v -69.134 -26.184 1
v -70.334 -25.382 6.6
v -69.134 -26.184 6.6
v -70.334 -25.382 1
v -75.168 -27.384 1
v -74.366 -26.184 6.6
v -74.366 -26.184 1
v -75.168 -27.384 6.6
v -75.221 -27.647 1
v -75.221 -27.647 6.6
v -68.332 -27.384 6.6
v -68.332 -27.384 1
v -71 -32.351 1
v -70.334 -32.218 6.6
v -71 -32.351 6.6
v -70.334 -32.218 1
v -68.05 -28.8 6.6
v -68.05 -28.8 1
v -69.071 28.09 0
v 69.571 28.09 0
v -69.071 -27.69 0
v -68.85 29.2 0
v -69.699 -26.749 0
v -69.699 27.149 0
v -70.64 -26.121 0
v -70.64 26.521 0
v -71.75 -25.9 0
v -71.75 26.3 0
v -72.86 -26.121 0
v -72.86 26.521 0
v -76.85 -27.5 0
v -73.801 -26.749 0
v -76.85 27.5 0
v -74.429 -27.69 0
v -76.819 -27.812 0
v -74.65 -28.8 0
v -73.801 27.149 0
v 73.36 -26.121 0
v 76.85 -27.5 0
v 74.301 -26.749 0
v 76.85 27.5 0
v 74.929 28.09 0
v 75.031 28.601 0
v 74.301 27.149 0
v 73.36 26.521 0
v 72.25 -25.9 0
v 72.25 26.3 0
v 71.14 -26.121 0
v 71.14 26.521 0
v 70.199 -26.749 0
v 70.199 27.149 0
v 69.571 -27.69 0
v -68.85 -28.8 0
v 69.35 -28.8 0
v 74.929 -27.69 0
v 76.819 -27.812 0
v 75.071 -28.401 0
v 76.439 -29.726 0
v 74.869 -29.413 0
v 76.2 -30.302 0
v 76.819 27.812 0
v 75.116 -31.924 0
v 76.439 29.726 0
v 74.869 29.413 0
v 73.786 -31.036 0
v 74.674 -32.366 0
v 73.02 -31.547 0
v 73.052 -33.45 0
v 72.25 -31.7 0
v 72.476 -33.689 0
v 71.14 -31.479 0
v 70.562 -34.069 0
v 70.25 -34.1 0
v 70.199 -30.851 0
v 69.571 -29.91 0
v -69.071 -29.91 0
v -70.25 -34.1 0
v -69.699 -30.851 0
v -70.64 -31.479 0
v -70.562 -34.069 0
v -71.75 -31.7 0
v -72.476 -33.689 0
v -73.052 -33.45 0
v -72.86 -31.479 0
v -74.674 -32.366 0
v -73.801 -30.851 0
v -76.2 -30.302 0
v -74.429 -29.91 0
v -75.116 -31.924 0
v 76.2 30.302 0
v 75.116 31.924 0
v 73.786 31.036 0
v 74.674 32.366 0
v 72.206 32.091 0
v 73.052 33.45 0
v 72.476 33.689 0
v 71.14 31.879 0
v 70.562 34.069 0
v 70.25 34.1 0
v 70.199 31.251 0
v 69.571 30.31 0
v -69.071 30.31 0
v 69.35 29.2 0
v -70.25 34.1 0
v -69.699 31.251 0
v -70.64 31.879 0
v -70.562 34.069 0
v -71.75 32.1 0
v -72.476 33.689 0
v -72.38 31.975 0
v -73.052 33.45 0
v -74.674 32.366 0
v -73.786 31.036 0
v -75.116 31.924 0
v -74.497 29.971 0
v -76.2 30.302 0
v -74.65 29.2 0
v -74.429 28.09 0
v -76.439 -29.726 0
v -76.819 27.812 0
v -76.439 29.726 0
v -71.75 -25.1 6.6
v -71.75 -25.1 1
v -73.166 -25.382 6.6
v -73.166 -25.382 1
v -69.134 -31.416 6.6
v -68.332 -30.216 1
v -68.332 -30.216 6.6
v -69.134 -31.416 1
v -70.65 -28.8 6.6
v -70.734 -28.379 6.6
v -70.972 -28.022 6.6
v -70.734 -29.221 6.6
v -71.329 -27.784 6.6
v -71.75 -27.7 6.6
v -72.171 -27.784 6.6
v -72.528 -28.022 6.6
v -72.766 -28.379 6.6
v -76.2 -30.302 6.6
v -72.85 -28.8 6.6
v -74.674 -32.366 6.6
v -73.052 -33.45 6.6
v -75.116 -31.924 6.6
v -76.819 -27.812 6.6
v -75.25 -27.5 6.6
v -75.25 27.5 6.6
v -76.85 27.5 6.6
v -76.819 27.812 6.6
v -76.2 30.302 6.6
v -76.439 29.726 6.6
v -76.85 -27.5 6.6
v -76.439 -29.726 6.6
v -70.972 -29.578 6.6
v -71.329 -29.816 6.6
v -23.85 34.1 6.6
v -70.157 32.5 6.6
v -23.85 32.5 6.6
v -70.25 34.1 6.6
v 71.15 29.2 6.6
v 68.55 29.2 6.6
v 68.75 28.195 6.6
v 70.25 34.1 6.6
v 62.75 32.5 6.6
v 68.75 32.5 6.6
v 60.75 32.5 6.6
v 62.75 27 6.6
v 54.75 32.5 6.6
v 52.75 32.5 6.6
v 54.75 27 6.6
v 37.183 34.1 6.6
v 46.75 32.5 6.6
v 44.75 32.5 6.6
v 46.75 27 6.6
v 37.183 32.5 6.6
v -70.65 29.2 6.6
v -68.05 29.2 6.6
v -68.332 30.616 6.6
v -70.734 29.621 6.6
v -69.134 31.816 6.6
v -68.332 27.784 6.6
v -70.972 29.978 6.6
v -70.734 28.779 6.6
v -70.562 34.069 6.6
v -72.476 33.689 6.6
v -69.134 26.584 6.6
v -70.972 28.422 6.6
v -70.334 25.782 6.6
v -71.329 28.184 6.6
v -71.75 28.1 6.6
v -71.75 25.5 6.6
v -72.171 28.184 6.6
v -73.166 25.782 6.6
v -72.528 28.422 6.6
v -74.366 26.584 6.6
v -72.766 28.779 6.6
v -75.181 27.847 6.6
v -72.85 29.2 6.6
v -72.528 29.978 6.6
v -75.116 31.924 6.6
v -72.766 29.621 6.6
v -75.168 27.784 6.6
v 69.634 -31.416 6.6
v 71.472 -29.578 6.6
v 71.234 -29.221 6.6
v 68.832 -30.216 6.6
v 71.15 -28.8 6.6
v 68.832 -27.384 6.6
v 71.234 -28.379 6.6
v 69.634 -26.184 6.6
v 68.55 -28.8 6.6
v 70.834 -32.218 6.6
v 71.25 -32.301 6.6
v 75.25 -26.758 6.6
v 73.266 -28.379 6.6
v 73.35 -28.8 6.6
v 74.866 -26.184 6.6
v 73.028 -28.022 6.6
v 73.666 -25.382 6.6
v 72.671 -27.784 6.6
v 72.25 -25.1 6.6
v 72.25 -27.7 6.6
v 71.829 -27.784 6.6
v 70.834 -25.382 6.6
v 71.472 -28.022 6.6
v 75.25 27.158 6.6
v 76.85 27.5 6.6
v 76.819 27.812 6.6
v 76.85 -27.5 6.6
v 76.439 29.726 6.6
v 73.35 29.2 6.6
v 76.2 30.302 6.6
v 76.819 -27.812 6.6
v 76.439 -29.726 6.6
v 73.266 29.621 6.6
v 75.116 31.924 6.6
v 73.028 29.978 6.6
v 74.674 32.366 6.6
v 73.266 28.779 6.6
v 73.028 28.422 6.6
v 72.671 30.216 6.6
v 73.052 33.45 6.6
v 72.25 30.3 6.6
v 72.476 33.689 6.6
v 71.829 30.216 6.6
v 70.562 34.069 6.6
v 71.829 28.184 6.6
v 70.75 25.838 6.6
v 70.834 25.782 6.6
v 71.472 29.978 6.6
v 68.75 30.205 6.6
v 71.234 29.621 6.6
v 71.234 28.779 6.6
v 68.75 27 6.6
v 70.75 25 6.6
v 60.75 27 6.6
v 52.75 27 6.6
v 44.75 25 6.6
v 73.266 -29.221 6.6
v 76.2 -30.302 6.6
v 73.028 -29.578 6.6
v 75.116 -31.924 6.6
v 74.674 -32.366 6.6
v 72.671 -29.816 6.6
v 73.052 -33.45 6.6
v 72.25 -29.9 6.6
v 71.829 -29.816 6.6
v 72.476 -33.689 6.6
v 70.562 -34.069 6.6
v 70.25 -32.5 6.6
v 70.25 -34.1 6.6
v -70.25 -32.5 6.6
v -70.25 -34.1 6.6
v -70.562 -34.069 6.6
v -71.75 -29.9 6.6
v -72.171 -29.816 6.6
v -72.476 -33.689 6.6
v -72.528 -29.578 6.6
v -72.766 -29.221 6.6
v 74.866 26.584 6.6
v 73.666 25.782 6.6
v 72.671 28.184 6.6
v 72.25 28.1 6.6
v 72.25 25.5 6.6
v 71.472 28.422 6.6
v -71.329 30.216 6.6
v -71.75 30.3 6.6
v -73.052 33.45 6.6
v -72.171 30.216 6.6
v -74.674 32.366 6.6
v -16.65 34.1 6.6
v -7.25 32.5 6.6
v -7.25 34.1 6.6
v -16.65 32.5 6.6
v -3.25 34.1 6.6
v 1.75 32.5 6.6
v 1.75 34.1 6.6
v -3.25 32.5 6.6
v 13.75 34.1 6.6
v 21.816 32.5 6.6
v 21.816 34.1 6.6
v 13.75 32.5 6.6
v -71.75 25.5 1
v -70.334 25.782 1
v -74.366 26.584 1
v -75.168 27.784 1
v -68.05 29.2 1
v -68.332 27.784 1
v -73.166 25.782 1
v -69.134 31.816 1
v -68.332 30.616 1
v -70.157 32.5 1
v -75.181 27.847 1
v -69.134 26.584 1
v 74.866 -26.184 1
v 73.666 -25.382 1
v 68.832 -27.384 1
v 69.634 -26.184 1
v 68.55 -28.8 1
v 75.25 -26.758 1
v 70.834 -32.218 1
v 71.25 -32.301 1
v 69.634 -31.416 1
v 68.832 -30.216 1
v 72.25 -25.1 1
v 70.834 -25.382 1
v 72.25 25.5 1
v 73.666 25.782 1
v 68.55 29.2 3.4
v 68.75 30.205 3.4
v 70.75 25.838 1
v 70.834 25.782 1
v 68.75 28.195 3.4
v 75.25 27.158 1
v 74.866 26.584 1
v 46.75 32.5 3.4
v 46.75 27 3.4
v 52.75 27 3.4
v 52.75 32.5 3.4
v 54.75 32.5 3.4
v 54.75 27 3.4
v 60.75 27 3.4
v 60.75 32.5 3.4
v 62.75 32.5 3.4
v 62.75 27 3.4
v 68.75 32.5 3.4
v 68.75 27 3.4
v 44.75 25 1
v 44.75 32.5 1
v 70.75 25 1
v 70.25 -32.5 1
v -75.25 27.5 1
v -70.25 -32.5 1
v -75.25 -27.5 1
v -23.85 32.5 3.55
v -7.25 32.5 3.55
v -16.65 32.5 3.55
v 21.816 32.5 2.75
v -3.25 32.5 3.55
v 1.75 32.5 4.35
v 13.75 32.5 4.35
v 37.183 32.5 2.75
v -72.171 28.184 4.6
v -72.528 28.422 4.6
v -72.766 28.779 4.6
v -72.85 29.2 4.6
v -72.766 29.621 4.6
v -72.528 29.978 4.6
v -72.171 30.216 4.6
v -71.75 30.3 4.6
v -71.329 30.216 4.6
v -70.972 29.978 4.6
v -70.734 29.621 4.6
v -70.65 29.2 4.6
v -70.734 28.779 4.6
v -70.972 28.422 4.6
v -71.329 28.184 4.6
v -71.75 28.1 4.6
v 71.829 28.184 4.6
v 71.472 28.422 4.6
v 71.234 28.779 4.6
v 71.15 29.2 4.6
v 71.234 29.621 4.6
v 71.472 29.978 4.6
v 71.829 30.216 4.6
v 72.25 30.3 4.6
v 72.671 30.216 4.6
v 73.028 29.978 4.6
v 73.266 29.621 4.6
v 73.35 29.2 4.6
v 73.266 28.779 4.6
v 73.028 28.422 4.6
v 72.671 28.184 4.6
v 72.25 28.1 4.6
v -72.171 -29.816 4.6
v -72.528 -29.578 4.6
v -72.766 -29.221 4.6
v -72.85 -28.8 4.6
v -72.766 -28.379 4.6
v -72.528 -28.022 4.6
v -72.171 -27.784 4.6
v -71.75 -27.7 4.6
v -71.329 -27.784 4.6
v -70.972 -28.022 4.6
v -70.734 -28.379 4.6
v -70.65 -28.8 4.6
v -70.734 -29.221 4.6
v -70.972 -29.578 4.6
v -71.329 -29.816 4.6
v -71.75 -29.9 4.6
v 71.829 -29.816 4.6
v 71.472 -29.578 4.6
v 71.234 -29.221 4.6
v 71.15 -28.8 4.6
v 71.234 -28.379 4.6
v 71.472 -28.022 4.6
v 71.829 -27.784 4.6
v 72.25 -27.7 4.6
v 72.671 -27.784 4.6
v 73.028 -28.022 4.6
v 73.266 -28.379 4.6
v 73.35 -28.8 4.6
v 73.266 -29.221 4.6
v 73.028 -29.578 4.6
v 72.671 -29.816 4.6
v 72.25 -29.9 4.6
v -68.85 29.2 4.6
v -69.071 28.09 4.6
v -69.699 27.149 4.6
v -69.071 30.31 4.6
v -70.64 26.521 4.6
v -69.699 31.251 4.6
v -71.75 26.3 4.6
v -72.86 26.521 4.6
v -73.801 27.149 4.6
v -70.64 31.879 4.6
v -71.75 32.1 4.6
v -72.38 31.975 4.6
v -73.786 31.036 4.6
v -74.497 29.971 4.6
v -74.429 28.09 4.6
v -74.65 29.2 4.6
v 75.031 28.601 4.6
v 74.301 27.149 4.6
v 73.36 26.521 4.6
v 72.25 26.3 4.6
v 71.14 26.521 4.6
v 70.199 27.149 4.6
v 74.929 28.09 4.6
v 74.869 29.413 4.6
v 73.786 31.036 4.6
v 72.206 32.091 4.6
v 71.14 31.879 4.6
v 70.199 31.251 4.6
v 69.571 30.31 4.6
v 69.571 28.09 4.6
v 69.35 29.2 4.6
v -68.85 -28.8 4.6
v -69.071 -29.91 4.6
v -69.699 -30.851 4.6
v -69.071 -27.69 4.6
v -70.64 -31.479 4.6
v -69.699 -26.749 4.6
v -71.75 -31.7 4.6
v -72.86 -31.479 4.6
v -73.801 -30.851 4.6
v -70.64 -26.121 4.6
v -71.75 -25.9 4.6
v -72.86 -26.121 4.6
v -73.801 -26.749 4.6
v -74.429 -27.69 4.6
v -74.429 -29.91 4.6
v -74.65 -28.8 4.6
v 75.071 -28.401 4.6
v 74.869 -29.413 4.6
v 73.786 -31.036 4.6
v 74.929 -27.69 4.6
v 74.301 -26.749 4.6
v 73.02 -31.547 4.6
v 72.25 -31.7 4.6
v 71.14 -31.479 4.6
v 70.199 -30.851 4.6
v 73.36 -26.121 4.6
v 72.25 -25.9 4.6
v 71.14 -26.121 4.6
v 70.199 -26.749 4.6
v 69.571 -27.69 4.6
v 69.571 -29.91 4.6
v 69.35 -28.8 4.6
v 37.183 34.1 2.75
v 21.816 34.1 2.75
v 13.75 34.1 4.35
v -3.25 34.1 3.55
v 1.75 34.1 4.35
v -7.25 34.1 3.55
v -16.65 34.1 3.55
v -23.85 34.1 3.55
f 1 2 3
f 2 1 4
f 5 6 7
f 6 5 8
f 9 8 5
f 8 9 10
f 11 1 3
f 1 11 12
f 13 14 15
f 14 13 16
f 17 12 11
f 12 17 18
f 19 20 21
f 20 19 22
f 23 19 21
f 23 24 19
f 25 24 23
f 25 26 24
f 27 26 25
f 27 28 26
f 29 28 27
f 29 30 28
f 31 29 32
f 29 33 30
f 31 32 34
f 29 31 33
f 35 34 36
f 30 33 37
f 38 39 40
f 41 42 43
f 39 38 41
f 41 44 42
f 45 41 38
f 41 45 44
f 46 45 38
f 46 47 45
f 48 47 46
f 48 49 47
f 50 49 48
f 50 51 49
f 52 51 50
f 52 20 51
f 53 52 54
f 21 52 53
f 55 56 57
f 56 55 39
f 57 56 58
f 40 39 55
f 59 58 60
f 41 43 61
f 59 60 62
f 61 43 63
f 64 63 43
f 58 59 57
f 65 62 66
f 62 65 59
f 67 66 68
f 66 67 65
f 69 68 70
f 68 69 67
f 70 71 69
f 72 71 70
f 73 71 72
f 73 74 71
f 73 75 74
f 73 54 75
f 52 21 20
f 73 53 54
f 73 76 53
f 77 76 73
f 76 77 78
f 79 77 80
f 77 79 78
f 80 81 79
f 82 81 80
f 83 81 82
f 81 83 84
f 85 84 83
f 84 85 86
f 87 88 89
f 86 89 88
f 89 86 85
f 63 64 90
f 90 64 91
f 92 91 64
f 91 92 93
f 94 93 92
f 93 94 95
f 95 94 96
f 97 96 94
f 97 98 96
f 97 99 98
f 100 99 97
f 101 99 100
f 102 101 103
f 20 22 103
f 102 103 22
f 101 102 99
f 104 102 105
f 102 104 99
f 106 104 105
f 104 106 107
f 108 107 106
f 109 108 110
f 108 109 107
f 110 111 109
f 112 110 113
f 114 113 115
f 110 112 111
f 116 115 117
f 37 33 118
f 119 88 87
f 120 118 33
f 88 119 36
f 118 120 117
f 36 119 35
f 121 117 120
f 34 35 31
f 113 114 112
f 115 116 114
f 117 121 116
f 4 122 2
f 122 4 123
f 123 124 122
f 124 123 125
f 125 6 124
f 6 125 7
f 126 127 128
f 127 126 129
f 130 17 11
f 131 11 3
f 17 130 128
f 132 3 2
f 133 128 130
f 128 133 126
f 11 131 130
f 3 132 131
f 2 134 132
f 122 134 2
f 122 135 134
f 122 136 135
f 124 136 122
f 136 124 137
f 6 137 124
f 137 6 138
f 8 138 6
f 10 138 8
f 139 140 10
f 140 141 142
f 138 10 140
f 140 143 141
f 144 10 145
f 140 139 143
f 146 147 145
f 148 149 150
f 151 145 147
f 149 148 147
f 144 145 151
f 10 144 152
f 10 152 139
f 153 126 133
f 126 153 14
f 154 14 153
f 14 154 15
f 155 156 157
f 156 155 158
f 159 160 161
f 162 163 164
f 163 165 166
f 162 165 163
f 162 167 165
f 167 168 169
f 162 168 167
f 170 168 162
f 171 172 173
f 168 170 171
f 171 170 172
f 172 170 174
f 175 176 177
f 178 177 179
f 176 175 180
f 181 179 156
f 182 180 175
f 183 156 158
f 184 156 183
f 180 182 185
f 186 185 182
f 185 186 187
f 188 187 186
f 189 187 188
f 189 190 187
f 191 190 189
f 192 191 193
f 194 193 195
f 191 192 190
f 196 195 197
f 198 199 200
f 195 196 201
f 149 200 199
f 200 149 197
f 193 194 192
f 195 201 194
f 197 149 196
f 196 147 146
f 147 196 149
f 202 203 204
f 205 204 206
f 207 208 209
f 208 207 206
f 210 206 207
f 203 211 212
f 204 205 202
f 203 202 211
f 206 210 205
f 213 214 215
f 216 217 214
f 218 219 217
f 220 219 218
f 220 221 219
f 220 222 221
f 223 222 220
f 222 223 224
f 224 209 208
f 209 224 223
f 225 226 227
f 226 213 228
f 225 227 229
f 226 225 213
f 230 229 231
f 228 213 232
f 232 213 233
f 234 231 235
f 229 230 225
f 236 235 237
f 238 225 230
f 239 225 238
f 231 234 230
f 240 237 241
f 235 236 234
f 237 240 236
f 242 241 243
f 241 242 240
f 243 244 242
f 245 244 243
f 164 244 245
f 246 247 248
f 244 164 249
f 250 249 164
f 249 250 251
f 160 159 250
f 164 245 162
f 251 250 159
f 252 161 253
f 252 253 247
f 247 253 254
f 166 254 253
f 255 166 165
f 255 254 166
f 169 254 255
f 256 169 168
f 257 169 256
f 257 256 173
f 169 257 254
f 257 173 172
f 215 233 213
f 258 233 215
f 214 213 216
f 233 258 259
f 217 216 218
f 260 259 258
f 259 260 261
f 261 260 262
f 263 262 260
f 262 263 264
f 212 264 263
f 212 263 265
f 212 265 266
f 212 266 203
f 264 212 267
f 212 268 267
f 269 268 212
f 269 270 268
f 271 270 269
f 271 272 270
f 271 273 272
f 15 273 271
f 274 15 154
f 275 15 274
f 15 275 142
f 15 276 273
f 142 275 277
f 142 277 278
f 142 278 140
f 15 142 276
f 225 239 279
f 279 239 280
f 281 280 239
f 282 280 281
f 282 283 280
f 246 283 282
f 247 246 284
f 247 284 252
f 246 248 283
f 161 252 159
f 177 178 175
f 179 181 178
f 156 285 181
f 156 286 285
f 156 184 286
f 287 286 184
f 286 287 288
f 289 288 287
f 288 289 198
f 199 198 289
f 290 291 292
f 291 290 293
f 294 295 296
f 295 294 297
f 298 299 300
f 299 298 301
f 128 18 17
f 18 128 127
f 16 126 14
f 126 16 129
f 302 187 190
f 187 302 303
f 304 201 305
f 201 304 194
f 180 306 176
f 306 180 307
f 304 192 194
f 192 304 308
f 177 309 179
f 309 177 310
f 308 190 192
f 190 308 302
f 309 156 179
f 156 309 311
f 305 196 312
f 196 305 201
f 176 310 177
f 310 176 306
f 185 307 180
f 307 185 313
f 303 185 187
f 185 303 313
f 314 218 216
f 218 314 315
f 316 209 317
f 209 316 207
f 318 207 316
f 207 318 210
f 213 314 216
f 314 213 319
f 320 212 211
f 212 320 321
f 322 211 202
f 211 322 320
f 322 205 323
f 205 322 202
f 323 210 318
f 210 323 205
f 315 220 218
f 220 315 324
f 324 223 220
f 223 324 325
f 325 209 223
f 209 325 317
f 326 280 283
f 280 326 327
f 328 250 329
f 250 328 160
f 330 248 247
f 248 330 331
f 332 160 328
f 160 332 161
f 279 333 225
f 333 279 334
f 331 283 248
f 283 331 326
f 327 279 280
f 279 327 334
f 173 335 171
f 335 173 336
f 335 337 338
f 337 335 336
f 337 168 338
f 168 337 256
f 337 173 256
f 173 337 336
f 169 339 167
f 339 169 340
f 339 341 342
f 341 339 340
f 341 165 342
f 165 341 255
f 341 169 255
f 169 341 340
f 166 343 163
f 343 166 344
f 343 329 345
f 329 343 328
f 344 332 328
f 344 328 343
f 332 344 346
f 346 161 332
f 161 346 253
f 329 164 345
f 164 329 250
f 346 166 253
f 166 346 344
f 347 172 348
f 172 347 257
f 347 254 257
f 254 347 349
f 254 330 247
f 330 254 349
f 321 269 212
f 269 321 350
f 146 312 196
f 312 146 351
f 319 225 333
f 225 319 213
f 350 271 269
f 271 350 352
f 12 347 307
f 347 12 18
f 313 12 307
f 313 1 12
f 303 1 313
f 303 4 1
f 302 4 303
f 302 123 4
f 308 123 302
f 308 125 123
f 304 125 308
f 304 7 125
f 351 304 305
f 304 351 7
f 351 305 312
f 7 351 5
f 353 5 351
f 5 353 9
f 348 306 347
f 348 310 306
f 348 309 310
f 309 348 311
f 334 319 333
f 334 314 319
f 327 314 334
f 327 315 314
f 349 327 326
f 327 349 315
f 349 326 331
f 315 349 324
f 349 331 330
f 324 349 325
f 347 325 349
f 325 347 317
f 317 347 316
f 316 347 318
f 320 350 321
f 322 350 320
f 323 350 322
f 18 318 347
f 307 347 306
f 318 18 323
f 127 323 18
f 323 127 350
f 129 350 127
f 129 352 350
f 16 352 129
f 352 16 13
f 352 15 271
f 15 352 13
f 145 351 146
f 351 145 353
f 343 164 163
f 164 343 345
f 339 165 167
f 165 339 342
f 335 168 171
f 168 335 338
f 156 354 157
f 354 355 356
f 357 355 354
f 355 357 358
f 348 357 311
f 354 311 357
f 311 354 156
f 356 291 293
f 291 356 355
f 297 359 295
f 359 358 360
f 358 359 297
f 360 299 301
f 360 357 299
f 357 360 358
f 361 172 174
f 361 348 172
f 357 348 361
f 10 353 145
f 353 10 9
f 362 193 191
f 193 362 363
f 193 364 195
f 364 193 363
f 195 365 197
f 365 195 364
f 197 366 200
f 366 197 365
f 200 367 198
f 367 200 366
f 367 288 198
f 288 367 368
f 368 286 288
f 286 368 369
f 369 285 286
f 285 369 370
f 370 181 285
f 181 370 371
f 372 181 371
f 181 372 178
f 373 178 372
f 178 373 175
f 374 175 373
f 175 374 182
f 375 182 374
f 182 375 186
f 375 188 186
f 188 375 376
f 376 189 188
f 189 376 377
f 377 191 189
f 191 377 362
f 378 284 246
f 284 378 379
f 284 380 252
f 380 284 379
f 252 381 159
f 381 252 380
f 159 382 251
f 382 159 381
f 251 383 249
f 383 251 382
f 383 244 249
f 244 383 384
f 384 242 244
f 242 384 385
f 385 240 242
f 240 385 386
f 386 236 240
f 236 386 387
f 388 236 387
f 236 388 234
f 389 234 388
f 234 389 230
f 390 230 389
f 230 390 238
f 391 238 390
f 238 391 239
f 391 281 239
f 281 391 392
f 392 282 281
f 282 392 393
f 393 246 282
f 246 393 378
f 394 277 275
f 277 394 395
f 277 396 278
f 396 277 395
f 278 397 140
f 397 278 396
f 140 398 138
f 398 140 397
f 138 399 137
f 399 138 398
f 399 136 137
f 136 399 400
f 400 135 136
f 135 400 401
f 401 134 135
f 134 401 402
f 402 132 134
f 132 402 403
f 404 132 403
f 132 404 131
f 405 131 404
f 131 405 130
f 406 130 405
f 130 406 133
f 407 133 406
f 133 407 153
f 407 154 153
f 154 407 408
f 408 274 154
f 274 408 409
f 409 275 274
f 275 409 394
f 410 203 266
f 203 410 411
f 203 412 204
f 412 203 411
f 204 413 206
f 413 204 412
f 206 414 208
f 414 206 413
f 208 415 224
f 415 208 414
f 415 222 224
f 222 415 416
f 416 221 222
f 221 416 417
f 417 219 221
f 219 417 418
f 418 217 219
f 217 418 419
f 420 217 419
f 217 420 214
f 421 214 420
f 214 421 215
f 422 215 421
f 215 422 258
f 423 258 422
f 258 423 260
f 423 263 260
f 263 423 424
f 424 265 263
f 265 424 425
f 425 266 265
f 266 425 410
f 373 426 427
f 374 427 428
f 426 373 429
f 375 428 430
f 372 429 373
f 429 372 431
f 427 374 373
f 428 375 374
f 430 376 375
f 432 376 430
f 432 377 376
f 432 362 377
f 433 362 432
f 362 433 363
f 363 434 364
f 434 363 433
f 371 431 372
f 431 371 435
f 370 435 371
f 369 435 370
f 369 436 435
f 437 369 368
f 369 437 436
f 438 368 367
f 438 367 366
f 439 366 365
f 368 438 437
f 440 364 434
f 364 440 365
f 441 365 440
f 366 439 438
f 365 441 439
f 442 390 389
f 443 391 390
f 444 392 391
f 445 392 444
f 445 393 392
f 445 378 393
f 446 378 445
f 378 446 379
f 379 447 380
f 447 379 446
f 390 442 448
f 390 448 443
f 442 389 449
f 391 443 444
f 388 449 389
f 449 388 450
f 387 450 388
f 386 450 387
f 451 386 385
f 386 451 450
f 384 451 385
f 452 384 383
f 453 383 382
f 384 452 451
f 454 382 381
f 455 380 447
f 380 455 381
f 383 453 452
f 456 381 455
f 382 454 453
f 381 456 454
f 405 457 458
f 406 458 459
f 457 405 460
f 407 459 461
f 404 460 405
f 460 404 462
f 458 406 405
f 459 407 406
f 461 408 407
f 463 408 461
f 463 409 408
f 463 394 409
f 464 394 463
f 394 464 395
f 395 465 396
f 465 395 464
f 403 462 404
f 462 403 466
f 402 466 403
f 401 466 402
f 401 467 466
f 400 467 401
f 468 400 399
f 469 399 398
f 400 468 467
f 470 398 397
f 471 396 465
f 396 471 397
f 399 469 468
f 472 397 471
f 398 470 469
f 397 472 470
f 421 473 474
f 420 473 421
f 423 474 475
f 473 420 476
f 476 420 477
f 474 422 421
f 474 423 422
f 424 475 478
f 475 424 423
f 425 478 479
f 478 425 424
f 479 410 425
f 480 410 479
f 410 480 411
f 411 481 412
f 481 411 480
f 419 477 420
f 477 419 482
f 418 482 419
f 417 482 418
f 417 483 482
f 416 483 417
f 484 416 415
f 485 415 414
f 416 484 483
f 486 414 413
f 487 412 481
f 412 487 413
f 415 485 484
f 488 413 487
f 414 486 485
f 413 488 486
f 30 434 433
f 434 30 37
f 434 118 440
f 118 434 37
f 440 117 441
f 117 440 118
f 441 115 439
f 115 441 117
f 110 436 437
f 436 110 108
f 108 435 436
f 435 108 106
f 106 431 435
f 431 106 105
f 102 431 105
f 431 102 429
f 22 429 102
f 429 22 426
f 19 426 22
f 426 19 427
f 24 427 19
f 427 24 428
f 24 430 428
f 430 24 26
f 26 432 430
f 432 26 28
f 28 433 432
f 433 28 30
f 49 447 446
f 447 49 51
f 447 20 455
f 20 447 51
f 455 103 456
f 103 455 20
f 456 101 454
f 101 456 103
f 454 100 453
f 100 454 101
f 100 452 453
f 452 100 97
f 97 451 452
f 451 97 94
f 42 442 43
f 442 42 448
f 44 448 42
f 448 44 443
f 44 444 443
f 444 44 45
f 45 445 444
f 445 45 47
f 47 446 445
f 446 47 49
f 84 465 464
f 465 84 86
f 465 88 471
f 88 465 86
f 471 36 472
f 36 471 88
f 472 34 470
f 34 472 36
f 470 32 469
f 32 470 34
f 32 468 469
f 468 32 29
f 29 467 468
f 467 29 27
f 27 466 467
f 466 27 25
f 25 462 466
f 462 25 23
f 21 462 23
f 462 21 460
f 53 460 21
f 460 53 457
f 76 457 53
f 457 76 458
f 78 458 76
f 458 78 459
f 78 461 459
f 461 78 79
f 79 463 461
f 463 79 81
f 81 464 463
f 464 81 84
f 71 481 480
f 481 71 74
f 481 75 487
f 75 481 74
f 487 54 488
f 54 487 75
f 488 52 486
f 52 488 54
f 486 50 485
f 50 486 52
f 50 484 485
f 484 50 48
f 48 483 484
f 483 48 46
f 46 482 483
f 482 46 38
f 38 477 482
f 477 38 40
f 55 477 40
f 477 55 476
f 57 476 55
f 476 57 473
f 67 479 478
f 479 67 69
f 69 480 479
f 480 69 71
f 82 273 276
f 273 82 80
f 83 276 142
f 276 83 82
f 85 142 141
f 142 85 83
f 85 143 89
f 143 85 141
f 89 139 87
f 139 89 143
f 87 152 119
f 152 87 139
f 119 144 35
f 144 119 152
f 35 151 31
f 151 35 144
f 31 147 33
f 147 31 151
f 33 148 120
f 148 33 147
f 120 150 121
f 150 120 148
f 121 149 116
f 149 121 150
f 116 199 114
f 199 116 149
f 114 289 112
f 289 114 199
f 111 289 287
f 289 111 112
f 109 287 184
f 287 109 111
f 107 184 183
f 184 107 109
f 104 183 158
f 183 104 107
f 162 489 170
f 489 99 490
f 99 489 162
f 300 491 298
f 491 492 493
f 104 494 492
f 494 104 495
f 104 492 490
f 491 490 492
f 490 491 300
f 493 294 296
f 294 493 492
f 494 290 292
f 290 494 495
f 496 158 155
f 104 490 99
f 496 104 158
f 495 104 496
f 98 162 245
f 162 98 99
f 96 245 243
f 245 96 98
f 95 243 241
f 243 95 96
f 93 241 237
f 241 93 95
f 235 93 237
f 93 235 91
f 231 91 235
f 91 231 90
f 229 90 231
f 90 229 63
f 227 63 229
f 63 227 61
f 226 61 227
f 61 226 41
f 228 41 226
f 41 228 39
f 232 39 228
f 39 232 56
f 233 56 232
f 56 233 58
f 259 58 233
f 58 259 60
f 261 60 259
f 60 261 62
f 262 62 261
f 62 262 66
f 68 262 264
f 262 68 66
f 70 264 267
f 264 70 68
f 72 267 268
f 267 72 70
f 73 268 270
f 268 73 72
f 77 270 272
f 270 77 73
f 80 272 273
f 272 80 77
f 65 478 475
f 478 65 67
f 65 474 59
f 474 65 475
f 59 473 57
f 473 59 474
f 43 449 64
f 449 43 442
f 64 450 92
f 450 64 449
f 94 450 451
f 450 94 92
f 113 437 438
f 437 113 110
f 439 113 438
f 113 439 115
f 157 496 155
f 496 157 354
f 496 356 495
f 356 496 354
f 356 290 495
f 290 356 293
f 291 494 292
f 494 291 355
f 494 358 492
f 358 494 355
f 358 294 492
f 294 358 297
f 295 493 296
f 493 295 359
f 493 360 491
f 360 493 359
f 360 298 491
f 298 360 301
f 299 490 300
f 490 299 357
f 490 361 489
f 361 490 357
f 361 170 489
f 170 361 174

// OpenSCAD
// file: common.scad
// Copyright 2019 a.j.buxton@gmail.com
// CC BY-NC-ND 4.0

w = 150.5;
h = 65;


button_radius = 8.4/2;
button_height = 4.5;

// abxy and dpad holes
button_hole_diameter = 29;
// analog stick
analog_hole_diameter = 22.5;


button_letters = ["A", "B", "X", "Y"];
button_rotations = [180, 90, 270, 0];
button_colours = ["red", "yellow", "lightblue", "lightgreen"];





module outline() {
    offset(5) offset(-5) square([w, h], center=true);
}


module shell(height=7.6) {
    difference() {
        linear_extrude(height=height) difference() {
            offset(1.6) outline();
            outline();

        }
    }
}


module dpad_pos() {
    translate([(w/2)-17.5, -9]) children();
}

module analog_pos() {
    translate([(w/2)-16.75, 21.25]) children();
}

module btn_pos() {
    translate([18.7-(w/2), 10.4]) children();
}

module smlbtn_pos() {
    translate([18.7-(w/2), -17.5]) children();
}

module led_pos() {
    translate([-48.75, 30]) children();
    translate([-56.75, 30]) children();
    translate([-64.75, 30]) children();
}

module screw_pos(internal=true) {
    translate([0, 0.2, 0]) {
        translate([143.5/2, 0]) {
            translate([0, -29]) children();
            if (internal) translate([0, 0]) children();
            translate([0, 29]) children();
            if (internal) translate([-30, 0]) {
                //translate([0, -29]) children();
                translate([0, 0]) children();
                translate([0, 29]) children();
            }
        }
        translate([-144.5/2, 0]) {
            translate([0, -29]) children();
            if (internal) translate([0, 0]) children();
            translate([0, 29]) children();
            if (internal) translate([30, 0]) {
                translate([0, -29]) children();
                //translate([0, 0]) children();
                translate([0, 29]) children();
            }
        }
    }
}


// TODO: Remove these


module dpad() {
    offset(r=0.5) offset(r=-0.5) offset(r=-0.5) offset(r=0.5) union() {
        square([6.5, 19], center=true);
        square([19, 6.5], center=true);
    }
}

module smlbtn() {
    translate([9.5/2, 0]) children(); //circle(d=5.2);
    translate([-9.5/2, 0]) children();

}
// main file
// Copyright 2019 a.j.buxton@gmail.com
// CC BY-NC-ND 4.0

include <common.scad>;

RES = undef;

$fn = RES ? RES : 16;


back_depth=5.6;
back_thickness=1.0;
screw_thickness = 2.0;


module back() {
    difference() {
        union() {
            shell(height=back_depth+back_thickness);
            difference() {
                union() {
                    screw_pos(false) cylinder(d=7.4, h=back_depth+back_thickness);
                    difference() {
                        linear_extrude(height=back_depth+back_thickness) difference() {
                            outline();
                        }
                        led_pos() translate([-1, 1, back_depth+back_thickness-0.2]) cube([6, 8, 6], center=true);
                        difference() {
                            translate([0, 0, back_thickness]) linear_extrude(height=10) outline();

                            translate([-1, 0, 0]) led_pos() cube([10, 10, 20], center=true);
                        }
                    }
                }

                translate([0, 0, 1.5]) linear_extrude(height=20) screw_pos(false) circle(d=2.2);
                translate([0, 0, -screw_thickness]) linear_extrude(height=back_depth+back_thickness) screw_pos(false) circle(d=5.8);
            }
        }

        // usb
        translate([w/2 - 55, h/2, 5.1]) cube([7.2, 10, 3.1], center=true);
        // reset
        translate([w/2 - 70, h/2, 5.1]) cube([4, 10, 3.1], center=true);
        // SD
        translate([w/2 - 83, h/2, 5.5]) cube([12, 10, 2.3], center=true);
        // debug
        translate([w/2 - 104.75, h/2, 5.0]) cube([2.54*6.05, 10, 4.5], center=true);
    }
}


mirror([1, 0]) back();
